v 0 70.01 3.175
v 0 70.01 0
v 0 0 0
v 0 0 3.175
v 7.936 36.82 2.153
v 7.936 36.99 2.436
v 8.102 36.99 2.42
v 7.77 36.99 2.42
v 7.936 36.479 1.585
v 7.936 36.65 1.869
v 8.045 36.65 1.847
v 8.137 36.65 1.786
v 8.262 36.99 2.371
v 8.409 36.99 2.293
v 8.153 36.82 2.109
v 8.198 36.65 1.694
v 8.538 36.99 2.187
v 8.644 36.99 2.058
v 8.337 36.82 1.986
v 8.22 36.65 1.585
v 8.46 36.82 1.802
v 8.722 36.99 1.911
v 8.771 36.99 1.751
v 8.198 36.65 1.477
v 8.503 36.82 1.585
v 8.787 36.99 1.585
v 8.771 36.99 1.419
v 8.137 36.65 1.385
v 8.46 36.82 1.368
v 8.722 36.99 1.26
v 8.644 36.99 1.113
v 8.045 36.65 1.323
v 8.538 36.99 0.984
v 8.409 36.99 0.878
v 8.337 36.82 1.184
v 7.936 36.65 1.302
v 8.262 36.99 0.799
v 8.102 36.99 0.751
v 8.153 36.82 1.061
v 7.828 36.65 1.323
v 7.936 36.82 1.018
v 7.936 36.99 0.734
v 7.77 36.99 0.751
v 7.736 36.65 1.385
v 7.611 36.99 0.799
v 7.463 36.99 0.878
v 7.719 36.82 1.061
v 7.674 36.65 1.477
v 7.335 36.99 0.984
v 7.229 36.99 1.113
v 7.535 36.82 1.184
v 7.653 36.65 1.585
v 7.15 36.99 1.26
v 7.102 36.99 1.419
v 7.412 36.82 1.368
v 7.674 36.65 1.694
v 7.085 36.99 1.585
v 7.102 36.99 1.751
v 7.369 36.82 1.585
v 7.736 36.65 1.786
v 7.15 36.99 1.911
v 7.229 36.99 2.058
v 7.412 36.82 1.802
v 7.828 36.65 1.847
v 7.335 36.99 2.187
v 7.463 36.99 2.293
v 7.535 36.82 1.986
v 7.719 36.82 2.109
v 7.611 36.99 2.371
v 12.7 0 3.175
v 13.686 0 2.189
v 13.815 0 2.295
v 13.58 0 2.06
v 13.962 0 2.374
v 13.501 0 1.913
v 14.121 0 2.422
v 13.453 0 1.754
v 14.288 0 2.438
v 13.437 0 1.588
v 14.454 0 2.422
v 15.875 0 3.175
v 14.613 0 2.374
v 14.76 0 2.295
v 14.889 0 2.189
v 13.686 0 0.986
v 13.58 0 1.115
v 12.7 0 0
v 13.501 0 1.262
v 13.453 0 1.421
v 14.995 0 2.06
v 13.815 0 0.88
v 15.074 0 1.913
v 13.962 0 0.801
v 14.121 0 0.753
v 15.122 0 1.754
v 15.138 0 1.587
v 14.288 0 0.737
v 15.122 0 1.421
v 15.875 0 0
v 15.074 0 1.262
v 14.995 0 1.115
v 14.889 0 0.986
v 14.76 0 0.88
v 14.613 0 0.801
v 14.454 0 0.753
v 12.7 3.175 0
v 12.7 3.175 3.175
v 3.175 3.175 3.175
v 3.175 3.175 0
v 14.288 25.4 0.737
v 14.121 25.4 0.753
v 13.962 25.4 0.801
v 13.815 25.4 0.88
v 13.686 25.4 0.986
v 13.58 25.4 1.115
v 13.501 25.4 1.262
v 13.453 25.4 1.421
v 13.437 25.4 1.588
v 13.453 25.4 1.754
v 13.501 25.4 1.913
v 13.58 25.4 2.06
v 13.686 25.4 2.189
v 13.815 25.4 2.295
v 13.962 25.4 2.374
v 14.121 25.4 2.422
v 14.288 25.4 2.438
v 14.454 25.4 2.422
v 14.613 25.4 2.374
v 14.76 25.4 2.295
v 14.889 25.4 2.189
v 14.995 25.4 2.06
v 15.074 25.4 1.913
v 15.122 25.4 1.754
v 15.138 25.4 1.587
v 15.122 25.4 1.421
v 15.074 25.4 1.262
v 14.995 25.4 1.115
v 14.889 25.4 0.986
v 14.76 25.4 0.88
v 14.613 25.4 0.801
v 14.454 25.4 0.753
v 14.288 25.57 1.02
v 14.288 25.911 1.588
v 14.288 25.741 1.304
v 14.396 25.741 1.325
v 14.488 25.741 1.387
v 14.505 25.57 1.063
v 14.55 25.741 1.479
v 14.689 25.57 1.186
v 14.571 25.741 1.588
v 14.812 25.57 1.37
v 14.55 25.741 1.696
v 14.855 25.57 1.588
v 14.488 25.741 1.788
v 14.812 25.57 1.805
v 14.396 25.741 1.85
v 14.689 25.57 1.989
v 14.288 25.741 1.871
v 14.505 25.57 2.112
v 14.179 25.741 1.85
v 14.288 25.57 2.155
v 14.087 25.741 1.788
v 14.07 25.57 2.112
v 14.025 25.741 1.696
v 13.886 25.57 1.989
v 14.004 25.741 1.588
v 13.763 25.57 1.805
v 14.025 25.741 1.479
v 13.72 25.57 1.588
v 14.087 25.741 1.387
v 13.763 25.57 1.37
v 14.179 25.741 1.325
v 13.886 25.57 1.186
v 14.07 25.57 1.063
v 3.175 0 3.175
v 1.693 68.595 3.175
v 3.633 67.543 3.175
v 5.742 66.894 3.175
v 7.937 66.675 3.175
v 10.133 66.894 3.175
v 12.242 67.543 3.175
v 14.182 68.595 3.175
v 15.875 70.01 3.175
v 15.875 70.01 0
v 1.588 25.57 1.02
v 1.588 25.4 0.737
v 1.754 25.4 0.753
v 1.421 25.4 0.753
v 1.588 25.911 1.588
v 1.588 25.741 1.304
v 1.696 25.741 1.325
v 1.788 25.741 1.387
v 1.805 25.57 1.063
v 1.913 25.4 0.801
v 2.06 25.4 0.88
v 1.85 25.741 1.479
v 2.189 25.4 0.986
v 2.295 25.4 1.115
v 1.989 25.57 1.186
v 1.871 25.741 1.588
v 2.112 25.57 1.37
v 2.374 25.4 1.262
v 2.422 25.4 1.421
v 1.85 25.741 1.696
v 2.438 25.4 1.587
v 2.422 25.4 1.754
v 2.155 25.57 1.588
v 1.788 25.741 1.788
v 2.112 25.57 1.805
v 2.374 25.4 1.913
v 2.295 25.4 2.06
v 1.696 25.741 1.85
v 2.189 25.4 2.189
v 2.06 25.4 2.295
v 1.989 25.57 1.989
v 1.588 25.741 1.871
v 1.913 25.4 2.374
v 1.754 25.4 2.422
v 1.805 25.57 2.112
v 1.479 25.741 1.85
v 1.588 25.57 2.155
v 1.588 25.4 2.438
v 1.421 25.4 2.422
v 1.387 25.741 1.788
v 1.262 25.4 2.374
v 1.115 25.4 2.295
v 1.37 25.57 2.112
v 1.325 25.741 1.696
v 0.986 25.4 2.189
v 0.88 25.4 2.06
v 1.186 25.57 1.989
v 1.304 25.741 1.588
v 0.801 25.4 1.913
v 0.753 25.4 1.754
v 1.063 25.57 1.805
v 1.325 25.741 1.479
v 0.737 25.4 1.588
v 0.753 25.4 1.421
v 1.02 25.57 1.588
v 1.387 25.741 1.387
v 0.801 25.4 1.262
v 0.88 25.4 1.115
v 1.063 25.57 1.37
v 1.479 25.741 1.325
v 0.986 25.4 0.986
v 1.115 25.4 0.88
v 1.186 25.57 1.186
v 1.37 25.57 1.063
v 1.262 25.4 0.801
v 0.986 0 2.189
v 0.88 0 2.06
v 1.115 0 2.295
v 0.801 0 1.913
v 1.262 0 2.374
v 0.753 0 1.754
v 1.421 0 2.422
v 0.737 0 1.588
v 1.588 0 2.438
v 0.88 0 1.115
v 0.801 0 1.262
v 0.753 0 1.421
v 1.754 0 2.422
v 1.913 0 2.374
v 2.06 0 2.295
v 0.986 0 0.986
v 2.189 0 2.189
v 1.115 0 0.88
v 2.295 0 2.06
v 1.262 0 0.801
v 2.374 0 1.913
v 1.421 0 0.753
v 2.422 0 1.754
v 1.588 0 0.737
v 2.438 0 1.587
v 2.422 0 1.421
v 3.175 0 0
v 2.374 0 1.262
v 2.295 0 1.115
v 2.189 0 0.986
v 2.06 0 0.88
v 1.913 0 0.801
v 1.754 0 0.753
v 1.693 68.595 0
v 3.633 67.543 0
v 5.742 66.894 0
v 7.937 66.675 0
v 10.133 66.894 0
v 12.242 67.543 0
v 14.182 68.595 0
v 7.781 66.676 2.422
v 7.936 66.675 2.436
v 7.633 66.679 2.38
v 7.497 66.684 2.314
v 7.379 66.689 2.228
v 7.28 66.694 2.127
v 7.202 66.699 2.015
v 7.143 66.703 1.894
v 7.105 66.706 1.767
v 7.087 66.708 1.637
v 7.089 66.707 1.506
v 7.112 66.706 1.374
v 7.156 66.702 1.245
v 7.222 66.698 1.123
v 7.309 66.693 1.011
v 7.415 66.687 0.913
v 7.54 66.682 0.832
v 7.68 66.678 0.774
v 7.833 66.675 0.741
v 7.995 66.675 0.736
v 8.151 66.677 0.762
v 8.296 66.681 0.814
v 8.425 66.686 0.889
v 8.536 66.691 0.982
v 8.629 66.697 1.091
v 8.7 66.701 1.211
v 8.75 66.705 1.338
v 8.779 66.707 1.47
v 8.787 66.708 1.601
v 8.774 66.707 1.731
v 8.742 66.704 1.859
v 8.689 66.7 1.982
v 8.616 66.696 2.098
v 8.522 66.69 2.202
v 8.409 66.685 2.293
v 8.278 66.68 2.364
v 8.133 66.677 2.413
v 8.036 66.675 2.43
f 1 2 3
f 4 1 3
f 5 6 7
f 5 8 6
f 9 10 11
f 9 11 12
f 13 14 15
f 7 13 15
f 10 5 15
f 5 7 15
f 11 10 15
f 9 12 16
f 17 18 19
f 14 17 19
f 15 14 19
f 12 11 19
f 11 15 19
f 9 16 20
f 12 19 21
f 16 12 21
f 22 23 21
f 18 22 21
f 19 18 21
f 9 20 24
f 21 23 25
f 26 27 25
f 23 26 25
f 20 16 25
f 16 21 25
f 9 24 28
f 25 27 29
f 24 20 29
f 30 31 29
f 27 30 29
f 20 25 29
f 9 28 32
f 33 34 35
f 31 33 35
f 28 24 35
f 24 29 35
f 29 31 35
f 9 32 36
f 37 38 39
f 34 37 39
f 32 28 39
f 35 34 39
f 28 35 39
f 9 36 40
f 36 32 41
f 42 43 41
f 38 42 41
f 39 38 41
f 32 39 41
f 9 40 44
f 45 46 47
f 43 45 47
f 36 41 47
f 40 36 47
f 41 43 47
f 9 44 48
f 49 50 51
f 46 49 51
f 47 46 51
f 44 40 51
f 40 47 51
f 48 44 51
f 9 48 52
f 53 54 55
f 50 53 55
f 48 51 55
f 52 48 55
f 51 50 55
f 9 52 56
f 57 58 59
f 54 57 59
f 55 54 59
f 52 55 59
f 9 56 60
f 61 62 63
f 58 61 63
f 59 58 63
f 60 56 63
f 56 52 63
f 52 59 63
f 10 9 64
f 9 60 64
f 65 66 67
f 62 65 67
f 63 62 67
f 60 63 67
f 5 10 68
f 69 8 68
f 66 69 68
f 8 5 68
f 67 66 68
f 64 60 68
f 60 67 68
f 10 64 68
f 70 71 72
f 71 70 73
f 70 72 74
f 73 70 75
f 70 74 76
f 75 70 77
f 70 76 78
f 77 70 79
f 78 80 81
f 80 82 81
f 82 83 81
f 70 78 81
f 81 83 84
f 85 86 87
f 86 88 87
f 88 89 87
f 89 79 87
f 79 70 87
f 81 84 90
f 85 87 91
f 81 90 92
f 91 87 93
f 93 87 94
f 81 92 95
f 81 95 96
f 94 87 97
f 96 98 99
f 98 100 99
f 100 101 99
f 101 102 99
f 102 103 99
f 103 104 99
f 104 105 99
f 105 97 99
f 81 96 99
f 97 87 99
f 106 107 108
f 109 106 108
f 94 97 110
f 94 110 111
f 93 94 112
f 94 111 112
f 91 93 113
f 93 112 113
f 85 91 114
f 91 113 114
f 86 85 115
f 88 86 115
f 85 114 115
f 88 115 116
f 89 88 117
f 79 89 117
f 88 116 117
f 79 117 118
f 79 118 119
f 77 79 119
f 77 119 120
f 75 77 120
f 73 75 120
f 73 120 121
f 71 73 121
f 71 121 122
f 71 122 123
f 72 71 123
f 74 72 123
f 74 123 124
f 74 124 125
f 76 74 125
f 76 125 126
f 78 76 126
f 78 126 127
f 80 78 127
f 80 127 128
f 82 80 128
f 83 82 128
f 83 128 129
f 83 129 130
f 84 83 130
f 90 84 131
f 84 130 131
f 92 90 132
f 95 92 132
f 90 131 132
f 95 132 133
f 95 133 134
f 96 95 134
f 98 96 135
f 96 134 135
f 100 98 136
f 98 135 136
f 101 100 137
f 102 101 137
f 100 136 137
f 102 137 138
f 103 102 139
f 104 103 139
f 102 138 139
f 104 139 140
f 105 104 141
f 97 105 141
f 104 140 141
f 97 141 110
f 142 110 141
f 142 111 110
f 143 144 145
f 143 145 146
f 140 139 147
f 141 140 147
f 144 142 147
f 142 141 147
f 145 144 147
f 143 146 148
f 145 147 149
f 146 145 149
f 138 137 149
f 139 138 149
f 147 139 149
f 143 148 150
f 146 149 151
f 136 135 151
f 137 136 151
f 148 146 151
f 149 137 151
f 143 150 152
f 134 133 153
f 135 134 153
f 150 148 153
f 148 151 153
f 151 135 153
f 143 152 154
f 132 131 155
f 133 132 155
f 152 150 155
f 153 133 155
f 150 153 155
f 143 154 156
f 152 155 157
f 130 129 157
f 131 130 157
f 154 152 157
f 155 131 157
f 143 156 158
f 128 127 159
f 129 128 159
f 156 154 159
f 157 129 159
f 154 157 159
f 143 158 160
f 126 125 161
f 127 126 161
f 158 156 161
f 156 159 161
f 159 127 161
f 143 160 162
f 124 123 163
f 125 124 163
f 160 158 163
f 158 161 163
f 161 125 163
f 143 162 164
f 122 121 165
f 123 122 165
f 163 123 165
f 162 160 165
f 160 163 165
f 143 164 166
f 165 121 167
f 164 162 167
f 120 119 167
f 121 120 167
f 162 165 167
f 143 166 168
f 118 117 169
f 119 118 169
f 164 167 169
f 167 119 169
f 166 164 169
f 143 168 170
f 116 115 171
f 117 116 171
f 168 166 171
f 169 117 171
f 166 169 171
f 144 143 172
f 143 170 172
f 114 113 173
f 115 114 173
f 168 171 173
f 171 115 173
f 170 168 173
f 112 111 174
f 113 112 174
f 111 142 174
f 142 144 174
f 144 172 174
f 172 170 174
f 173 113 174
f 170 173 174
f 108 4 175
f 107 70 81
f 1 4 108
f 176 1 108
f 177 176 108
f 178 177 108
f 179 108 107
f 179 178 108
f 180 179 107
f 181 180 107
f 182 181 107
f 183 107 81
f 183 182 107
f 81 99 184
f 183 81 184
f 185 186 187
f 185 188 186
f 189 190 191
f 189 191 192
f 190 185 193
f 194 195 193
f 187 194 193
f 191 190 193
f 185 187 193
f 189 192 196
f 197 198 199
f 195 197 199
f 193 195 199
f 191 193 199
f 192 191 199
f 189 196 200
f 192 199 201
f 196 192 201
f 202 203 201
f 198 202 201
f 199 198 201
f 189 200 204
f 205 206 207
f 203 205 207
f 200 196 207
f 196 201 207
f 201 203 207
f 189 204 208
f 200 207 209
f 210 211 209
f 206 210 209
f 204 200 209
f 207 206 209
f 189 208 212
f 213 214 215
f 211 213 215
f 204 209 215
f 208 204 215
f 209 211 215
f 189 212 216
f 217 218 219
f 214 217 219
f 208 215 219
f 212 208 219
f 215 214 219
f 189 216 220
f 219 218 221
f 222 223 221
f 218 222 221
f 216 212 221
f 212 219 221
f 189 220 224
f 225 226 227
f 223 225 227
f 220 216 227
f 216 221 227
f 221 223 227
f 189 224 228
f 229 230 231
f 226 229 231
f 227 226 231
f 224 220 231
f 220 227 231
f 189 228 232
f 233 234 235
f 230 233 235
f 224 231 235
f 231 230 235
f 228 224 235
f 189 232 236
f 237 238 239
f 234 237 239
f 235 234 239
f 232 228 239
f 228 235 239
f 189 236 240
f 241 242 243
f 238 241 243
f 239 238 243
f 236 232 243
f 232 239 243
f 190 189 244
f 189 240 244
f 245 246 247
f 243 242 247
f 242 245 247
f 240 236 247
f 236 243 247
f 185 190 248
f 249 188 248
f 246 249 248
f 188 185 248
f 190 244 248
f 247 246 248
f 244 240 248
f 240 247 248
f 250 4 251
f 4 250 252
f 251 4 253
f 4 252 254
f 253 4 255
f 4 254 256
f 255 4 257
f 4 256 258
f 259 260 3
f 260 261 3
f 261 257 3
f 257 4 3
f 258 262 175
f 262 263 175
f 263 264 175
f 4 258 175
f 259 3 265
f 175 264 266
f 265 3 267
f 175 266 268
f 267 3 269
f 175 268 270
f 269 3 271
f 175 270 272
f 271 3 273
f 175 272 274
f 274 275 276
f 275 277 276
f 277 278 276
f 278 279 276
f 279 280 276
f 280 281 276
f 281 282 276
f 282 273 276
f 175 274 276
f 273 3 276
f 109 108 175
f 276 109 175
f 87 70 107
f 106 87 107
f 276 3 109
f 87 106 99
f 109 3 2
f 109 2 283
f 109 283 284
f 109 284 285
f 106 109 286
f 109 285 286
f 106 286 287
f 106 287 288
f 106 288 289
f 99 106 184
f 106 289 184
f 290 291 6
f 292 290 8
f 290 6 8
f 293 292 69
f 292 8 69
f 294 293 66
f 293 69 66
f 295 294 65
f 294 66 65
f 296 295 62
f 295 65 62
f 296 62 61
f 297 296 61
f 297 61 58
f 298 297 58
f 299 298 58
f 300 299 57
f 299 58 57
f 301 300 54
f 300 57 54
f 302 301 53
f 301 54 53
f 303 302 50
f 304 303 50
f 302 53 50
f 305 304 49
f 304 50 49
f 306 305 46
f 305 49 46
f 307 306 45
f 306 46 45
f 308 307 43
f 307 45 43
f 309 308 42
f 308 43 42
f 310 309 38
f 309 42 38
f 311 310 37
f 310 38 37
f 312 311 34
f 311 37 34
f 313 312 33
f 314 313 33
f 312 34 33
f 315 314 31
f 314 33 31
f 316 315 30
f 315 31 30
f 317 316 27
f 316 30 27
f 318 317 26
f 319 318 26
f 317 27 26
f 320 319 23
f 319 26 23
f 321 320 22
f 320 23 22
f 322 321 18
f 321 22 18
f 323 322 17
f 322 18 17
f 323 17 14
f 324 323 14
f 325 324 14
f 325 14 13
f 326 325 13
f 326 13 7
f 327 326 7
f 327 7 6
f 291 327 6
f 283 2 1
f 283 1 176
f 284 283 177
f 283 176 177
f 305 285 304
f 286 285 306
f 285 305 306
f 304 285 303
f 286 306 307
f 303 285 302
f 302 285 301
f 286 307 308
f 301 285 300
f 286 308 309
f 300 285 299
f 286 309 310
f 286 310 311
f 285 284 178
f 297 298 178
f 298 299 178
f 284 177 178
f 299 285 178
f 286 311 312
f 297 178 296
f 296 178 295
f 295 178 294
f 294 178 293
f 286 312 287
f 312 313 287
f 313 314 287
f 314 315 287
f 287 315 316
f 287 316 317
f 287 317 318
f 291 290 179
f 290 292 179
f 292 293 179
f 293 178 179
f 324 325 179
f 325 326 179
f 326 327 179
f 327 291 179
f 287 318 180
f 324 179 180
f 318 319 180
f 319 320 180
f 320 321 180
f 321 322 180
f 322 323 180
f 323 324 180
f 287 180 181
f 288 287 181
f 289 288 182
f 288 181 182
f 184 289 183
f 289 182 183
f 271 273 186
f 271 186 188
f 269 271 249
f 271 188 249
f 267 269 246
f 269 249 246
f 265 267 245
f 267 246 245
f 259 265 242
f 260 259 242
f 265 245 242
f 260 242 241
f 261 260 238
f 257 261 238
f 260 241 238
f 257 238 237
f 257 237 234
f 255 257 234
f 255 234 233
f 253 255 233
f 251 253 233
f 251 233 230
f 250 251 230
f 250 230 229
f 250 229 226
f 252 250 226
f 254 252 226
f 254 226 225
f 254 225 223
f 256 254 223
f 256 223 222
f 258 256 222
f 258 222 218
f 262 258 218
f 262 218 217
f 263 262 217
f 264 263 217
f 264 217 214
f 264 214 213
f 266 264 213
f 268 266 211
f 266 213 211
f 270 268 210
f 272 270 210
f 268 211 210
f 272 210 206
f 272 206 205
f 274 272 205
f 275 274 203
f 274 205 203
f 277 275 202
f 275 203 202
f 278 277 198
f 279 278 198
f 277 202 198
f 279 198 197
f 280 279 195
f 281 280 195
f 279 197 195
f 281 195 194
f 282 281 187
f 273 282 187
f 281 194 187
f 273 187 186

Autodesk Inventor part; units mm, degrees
ref_plane "YZ Plane" through (0, 0, 0) normal (1, 0, 0) x (0, 1, 0)
ref_plane "XZ Plane" through (0, 0, 0) normal (0, 1, 0) x (-1, 0, 0)
sketch "Sketch1" plane through (0, 0, 0) normal (0, 0, 1) x (1, 0, 0)
  line L0 (0, 0) -> (15.875, 0)
  line L1 (15.875, 0) -> (15.875, 77.724)
  line L2 (15.875, 77.724) -> (0, 77.724)
  line L3 (0, 77.724) -> (0, 0)
  dimension "d0" = 77.724
  dimension "d1" = 15.875
extrude "Extrusion1" add sketch "Sketch1" along normal blind 3.175
sketch "Sketch2" plane through (0, 0, 3.175) normal (0, 0, 1) x (1, 0, 0)
  line L0 (0, 0) -> (15.875, 0) projected
  line L1 (15.875, 77.724) -> (0, 77.724) projected
  line L2 (3.175, 0) -> (12.7, 0)
  line L3 (12.7, 0) -> (12.7, 3.175)
  line L4 (12.7, 3.175) -> (3.175, 3.175)
  line L5 (3.175, 3.175) -> (3.175, 0)
  line L6 (7.9375, 3.175) -> (7.9375, 0) construction
  line L7 (7.9375, 77.724) -> (7.9375, 0) construction
  dimension "d4" = 9.525
  dimension "d6" = 3.175
extrude "Extrusion2" cut sketch "Sketch2" against normal through all
sketch "Sketch3" plane through (0, 0, 3.175) normal (0, 0, 1) x (1, 0, 0)
  circle A0 centre (7.9375, 77.7875) radius 11.1125
  dimension "d11" = 22.225
extrude "Extrusion3" cut sketch "Sketch3" against normal blind 3.175
ref_plane "Work Plane1" through (15.875, 70.0104, 0) normal (0, -1, 0) x (0, 0, 1)
sketch "Sketch6" plane through (15.875, 70.0104, 0) normal (0, -1, 0) x (0, 0, 1)
  line L0 (3.1705, 0.0025) -> (0, 0.0025) construction
  line L1 (1.5853, 0.0025) -> (1.5853, 15.875) construction
  circle A0 centre (1.5853, 7.9388) radius 0.6177
  point P0 (0, 15.875)
hole "Hole3" at (7.9362, 70.0104, 1.5853) direction (0, -1, 0) diameter 1.7018 depth 33.02 tip angle 118
sketch "Sketch7" plane through (15.875, 0, 0) normal (0, -1, 0) x (1, 0, 0)
  line L0 (-15.875, 0) -> (0, 0) construction
  line L1 (0, 0) -> (0, 3.175) construction
  line L2 (0, 3.175) -> (-15.875, 3.175) construction
  line L3 (-15.875, 3.175) -> (-15.875, 0) construction
  line L4 (-7.9375, 3.175) -> (-7.9375, 0) construction
  circle A0 centre (-14.2875, 1.5875) radius 0.7756
  line L5 (-15.875, 0) -> (-15.875, 3.175) construction
  circle A1 centre (-1.5875, 1.5875) radius 0.7756
  point P0 (-3.175, 3.175)
  dimension "d36" = 15.875
  dimension "d37" = 6.35
hole "Hole4" at (14.2875, 0, 1.5875) at (1.5875, 0, 1.5875) direction (0, 1, 0) diameter 1.7018 depth 25.4 tip angle 118
properties part number "2f1ar" material "Brass, Soft Yellow"
